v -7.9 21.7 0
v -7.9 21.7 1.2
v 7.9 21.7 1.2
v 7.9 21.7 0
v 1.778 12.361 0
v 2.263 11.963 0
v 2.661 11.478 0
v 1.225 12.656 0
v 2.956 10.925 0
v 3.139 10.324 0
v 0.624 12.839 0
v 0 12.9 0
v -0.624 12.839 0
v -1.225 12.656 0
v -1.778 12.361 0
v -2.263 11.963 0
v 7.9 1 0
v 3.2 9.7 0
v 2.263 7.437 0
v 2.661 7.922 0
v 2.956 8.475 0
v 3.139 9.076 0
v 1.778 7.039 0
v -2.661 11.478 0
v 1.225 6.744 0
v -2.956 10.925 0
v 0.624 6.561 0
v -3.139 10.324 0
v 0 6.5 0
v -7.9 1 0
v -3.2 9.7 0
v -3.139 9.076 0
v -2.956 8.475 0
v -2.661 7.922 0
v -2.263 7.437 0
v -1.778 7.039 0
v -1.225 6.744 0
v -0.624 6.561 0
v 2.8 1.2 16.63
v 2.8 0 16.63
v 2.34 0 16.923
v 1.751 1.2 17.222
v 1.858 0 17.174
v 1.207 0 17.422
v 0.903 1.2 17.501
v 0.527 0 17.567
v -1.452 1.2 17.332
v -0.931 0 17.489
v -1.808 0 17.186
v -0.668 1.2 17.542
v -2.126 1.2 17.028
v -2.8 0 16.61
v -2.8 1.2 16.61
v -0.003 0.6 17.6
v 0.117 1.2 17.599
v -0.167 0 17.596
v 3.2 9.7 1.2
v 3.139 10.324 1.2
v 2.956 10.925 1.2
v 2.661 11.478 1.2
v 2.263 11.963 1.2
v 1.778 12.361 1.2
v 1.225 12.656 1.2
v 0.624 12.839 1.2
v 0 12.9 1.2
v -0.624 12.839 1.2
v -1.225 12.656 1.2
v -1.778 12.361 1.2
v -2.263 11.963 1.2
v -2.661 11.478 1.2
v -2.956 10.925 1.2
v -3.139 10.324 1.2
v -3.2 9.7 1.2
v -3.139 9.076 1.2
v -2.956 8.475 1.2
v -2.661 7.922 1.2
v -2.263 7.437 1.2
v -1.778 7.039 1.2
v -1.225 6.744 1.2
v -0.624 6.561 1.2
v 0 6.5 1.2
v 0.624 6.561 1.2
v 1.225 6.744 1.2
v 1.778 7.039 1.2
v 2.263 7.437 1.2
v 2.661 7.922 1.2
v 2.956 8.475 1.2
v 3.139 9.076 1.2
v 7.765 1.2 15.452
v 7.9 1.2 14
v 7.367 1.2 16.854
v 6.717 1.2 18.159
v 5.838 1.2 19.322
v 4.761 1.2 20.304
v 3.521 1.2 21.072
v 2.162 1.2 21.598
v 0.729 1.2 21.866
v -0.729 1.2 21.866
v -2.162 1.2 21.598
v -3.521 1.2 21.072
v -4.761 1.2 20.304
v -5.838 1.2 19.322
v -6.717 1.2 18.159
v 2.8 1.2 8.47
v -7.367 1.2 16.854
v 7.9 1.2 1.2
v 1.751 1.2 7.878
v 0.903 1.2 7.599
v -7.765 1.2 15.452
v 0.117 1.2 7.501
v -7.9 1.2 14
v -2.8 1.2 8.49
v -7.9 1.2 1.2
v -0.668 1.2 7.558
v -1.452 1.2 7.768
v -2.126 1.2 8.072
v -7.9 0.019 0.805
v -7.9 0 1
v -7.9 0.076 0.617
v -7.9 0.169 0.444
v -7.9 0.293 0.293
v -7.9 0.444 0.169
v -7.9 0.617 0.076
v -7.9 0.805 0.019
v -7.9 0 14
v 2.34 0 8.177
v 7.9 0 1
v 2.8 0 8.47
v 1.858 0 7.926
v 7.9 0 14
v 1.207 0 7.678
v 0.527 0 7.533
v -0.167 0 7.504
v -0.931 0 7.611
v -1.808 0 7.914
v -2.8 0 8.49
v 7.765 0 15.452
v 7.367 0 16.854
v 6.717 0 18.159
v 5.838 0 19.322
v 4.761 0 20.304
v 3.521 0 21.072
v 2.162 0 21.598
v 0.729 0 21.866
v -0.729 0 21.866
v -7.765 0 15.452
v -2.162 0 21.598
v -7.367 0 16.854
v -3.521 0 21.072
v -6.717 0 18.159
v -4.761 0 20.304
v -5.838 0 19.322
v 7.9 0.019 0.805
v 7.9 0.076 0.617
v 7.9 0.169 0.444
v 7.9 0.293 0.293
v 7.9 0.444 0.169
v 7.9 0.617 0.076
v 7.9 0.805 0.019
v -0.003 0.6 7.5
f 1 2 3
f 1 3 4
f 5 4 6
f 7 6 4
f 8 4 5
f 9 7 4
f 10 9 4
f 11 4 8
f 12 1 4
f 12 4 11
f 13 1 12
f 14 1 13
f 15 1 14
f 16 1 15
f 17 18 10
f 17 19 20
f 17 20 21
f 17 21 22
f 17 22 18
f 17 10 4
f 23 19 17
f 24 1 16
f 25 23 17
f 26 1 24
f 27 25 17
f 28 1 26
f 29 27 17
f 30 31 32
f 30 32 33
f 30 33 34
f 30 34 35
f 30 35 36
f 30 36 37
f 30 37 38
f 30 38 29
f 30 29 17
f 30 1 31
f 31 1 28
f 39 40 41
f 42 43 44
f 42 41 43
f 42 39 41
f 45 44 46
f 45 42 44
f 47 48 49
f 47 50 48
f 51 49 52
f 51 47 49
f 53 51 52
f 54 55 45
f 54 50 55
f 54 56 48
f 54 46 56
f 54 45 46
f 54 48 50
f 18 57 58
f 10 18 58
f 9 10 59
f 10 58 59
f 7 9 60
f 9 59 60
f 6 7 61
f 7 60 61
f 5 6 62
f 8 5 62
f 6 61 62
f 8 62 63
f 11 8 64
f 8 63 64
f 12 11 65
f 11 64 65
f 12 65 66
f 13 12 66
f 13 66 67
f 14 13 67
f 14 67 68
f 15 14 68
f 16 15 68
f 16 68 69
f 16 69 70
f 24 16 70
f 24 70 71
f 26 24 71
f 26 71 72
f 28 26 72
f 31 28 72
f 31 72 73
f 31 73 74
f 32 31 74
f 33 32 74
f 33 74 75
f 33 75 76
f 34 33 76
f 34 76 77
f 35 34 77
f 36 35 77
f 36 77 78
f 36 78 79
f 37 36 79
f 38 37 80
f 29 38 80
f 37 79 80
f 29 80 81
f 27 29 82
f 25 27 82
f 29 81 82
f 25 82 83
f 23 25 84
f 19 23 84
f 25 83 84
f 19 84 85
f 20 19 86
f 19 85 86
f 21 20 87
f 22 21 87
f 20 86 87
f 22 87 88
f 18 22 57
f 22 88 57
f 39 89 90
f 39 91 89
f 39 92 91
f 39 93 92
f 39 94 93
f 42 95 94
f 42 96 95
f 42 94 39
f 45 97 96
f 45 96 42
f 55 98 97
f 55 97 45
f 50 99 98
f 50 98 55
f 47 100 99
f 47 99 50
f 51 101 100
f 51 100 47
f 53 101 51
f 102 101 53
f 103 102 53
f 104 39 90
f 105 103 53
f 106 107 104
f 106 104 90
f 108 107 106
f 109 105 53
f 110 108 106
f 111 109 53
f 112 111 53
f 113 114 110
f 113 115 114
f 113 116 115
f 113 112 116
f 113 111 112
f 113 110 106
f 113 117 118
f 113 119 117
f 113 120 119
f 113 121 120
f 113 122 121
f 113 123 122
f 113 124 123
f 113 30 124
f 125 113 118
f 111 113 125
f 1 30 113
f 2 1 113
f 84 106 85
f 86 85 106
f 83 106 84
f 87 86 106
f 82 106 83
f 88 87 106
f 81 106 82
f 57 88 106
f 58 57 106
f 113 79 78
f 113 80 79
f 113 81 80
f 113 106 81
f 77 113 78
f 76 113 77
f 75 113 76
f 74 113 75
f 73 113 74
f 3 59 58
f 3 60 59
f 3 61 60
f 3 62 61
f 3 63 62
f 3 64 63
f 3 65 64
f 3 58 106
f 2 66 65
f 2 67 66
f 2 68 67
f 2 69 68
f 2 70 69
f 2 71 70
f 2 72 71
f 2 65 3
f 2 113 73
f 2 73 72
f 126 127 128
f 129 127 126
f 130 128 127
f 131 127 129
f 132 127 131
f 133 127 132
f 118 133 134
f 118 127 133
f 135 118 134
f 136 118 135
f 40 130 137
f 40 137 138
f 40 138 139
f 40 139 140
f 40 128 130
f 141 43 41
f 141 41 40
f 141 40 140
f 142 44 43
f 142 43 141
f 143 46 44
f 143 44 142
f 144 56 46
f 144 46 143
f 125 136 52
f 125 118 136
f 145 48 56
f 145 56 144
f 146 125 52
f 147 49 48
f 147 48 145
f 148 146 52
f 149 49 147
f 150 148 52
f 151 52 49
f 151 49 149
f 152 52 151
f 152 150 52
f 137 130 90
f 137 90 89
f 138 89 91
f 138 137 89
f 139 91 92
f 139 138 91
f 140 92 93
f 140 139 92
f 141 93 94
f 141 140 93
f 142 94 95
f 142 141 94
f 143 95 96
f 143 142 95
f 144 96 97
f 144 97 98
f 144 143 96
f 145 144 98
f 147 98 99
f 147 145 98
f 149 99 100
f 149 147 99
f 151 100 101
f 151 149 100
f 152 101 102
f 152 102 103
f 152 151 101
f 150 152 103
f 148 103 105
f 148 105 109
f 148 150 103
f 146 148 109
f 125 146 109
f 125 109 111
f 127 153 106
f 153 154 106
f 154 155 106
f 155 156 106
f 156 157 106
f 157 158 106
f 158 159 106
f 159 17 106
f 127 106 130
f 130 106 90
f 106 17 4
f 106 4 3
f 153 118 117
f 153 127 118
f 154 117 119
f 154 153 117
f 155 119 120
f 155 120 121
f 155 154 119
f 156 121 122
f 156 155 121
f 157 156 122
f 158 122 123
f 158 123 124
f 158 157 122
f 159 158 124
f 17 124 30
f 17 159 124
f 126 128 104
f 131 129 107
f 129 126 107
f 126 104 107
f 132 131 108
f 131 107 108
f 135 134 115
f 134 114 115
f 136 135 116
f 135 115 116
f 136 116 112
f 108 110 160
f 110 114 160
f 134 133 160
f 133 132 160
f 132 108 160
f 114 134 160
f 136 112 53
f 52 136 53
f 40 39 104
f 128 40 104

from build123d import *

# Parameters (mm, degrees)
BOSS_EXTRUDE1_DEPTH      = 7.9
BOSS_EXTRUDE1_DEPTH_BACK = 7.9
FILLET1_RADIUS           = 7.9
FILLET1_LENGTH           = 1.2
CUT_EXTRUDE3_DEPTH       = 32.020477108
SKETCH5_R                = 3.2
CUT_EXTRUDE4_DEPTH       = 32.01273941
FILLET3_R                = 1


with BuildPart() as part:
    # Sketch3 → Boss-Extrude1 (new, two sides: drawn at the far end of the back side and taken through both)
    with BuildSketch(Plane(origin=(0, 0, 0), x_dir=(0, 0, -1), z_dir=(1, 0, 0)).offset(-BOSS_EXTRUDE1_DEPTH_BACK)):
        Polygon((0, 0), (-21.9, 0), (-21.9, 1.2), (-1.2, 1.2), (-1.2, 21.7), (0, 21.7), align=None)
    extrude(amount=BOSS_EXTRUDE1_DEPTH + BOSS_EXTRUDE1_DEPTH_BACK)

    # Fillet1: full round fillet: the end face becomes a half cylinder, R = half its width
    fillet1_face = Plane((0, 0.6, 21.9), x_dir=(0, -1, 0), z_dir=(0, 0, 1))  # on the end face: x along it, z out of the body
    fillet1_slab = fillet1_face.offset(-FILLET1_RADIUS / 2) * Box(FILLET1_LENGTH, 2 * FILLET1_RADIUS, FILLET1_RADIUS, mode=Mode.PRIVATE)  # the body's end, R deep
    fillet1_round = Plane((0, 0.6, 14), x_dir=(0, 0, 1), z_dir=(0, -1, 0)) * Cylinder(FILLET1_RADIUS, FILLET1_LENGTH, mode=Mode.PRIVATE)  # its axis R under the face
    add(fillet1_slab - fillet1_round, mode=Mode.SUBTRACT)

    # Sketch4 → Cut-Extrude3 (cut, through all)
    with BuildSketch(Plane(origin=(0, 1.2, 0), x_dir=(1, 0, 0), z_dir=(0, 1, 0))):
        with BuildLine():
            Line((-2.8, -8.490258859), (-2.8, -16.609741141))
            add(Edge.make_bspline(
                [(2.8, -16.629870216), (-0.006277243, -18.580174221), (-2.8, -16.609741141)],
                knots=[0, 0, 0, 1, 1, 1], degree=2))
            Line((2.8, -16.629870216), (2.8, -8.470129784))
            add(Edge.make_bspline(
                [(2.8, -8.470129784), (-0.006277243, -6.519825779), (-2.8, -8.490258859)],
                knots=[0, 0, 0, 1, 1, 1], degree=2))
        make_face()
    extrude(amount=-CUT_EXTRUDE3_DEPTH, mode=Mode.SUBTRACT)

    # Sketch5 → Cut-Extrude4 (cut, through all)
    with BuildSketch(Plane.XY.offset(1.2)):
        with Locations((0, 9.7)):
            Circle(SKETCH5_R)
    extrude(amount=-CUT_EXTRUDE4_DEPTH, mode=Mode.SUBTRACT)

    # Fillet3
    fillet3_edges = [part.edges().sort_by_distance(p)[0] for p in [
        (0, 0, 0),
    ]]
    fillet(fillet3_edges, radius=FILLET3_R)


solid = part.part
